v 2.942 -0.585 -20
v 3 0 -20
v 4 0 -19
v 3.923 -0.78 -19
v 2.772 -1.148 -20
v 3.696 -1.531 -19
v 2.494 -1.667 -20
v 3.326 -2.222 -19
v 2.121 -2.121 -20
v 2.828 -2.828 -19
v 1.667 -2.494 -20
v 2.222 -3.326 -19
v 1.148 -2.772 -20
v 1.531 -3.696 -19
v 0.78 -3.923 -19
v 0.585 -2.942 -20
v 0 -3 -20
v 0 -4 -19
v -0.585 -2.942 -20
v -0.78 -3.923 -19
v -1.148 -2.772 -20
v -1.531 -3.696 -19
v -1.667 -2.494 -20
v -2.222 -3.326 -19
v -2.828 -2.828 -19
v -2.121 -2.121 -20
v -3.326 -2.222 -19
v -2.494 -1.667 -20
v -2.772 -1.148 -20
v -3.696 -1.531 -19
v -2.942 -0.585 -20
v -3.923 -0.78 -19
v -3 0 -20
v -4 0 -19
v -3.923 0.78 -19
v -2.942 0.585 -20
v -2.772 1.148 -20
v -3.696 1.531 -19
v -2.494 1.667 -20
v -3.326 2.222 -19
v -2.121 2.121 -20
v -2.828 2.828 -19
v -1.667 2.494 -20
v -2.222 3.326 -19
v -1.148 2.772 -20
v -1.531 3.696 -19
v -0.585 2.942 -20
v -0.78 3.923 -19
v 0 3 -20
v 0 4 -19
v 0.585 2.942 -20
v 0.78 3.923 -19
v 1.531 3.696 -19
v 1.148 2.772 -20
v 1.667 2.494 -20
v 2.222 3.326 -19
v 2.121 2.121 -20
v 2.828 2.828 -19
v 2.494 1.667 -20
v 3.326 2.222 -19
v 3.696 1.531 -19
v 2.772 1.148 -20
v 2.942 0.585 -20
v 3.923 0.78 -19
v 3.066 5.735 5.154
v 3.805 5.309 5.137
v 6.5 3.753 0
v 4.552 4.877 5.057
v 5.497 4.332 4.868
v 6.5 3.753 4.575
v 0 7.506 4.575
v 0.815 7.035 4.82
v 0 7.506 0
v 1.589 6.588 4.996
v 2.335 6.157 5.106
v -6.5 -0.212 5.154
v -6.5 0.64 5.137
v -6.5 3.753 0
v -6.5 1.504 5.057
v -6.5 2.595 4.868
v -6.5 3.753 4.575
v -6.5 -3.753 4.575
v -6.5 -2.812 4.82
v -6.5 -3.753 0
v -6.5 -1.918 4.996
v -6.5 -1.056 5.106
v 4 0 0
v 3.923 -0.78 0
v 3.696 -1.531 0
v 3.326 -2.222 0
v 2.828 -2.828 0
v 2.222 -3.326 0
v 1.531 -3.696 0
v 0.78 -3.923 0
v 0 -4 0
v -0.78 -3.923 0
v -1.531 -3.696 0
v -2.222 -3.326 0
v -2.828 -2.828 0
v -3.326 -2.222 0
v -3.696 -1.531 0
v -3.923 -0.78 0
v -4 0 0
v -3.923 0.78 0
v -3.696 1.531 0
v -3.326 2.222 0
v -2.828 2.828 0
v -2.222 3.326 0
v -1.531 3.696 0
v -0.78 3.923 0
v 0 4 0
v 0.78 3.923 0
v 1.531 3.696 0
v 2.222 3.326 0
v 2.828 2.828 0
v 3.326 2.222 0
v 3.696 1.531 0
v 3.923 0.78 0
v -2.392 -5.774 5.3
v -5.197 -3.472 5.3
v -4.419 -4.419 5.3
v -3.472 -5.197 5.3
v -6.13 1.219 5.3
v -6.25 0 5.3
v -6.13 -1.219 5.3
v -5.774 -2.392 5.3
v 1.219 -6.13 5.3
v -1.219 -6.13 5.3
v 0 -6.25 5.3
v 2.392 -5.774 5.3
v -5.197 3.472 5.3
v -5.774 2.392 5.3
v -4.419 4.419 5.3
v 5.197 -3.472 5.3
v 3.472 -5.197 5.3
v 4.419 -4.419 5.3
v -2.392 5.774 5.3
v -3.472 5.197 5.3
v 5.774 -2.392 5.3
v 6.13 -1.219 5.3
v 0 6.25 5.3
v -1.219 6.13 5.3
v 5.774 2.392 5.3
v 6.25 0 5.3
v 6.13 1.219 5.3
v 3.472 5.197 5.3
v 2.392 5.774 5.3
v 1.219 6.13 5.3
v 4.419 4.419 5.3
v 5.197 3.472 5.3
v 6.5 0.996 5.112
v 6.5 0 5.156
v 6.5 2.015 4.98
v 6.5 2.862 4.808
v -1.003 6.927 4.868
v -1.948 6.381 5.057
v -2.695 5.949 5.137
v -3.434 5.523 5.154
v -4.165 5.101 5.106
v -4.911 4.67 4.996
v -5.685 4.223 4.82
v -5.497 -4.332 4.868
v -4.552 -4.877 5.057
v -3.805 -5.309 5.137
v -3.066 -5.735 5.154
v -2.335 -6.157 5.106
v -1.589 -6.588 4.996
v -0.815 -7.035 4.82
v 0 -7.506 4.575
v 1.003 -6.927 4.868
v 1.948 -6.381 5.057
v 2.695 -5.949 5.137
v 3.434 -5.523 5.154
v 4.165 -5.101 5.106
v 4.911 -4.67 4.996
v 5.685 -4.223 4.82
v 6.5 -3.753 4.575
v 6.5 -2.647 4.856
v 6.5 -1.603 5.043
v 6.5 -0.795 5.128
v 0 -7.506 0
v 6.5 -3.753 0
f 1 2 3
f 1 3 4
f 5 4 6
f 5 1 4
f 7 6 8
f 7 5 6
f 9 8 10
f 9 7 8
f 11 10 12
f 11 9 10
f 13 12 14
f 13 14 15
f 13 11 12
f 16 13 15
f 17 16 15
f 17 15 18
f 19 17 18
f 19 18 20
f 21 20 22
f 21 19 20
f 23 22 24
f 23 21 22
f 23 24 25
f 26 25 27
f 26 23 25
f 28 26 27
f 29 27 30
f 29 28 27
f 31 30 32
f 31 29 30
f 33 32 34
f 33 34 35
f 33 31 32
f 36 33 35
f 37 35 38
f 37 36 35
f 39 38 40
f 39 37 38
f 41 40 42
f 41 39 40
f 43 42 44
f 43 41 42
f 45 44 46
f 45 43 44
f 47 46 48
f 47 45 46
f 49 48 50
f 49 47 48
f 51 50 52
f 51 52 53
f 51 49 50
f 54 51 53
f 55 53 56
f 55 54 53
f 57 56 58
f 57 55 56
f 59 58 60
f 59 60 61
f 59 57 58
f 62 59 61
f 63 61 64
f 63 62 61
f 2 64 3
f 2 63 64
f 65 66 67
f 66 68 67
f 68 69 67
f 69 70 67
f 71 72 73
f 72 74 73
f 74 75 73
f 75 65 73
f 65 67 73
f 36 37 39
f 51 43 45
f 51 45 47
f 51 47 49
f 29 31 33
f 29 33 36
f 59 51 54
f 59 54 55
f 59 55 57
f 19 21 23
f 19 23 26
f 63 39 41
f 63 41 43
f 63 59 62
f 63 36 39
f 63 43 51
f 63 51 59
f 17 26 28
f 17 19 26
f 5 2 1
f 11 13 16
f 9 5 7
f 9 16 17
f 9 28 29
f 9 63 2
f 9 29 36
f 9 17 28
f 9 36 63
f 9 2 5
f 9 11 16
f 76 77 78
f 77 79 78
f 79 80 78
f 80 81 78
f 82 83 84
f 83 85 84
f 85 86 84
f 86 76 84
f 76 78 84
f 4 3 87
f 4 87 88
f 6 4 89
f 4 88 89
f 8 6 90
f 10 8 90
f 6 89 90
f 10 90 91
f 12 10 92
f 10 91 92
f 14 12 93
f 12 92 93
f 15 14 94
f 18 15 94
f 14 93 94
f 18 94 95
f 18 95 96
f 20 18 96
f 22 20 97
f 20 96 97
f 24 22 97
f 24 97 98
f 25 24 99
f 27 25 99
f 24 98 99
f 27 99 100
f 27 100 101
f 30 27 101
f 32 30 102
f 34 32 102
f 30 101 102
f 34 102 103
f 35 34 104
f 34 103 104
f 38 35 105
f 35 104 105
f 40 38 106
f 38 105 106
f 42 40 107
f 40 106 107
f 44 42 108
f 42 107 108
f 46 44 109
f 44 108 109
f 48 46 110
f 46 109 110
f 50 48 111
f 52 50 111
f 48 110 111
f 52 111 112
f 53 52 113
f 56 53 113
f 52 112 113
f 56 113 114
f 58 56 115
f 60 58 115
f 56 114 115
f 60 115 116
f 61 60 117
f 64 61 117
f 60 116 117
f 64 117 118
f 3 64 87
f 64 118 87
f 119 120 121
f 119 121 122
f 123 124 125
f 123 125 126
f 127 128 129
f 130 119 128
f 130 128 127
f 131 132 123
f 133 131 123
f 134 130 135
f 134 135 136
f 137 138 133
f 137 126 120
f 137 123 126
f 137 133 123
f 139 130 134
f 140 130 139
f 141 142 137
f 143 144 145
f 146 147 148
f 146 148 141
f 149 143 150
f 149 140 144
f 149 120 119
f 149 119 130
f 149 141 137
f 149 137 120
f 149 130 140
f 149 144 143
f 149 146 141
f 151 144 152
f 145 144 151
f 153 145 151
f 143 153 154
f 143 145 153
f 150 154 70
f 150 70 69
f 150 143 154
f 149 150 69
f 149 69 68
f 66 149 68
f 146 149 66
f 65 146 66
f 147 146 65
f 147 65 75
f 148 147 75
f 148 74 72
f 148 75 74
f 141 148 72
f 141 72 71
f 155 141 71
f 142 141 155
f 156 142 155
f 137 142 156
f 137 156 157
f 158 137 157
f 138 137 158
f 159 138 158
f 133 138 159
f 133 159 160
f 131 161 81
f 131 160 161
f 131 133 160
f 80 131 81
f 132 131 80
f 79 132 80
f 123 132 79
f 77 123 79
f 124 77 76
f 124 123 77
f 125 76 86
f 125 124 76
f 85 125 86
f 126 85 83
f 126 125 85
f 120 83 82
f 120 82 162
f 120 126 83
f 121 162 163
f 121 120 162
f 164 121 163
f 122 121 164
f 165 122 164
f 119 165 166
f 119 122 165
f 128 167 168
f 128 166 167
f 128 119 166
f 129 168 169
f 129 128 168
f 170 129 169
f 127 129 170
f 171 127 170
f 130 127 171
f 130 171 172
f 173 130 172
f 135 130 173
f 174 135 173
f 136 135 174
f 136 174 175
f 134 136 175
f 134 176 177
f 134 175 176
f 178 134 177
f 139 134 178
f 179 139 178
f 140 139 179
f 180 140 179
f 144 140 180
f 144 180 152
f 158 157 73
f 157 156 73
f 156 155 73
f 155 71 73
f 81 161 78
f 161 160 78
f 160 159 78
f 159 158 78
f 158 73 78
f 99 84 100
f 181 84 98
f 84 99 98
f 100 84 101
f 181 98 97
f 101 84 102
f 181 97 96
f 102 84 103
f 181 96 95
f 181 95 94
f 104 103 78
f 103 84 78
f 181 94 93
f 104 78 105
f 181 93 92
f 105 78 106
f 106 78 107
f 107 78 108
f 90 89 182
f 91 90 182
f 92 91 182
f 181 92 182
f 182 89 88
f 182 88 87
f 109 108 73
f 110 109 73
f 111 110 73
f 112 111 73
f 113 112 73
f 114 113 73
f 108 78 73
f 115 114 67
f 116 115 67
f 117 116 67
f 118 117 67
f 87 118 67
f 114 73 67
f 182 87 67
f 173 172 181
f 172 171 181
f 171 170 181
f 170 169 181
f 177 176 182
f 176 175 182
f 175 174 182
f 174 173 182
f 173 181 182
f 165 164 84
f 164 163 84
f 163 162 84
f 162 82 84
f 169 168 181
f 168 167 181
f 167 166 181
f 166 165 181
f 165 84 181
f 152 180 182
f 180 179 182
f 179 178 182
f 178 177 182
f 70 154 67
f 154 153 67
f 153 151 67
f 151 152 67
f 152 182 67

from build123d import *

# Parameters (mm, degrees)
EXTRUDE_1_DEPTH     = 5.3
SKETCH_2_OUTSIDE_W  = 61.562
SKETCH_2_OUTSIDE_H  = 63.574
SKETCH_2_OUTSIDE_R  = 6.25
CUT_EXTRUDE_1_DEPTH = 12.254924848
CUT_EXTRUDE_1_DRAFT = -60
SKETCH_3_R          = 4
EXTRUDE_2_DEPTH     = 20
CHAMFER_1_SIZE      = 1


with BuildPart() as part:
    # Эскиз1 → Бобышка-Вытянуть1 (new body)
    with BuildSketch(Plane.XY):
        Polygon((0, 7.505553499), (-6.5, 3.75277675), (-6.5, -3.75277675), (0, -7.505553499), (6.5, -3.75277675), (6.5, 3.75277675), align=None)
    extrude(amount=EXTRUDE_1_DEPTH)


with BuildPart() as cut_extrude_1_tool:
    # Эскиз2 outside → Вырез-Вытянуть1 (with draft: the straight prism first)
    with BuildSketch(Plane.XY.offset(5.3)):
        Rectangle(SKETCH_2_OUTSIDE_W, SKETCH_2_OUTSIDE_H)
        Circle(SKETCH_2_OUTSIDE_R, mode=Mode.SUBTRACT)
    extrude(amount=-CUT_EXTRUDE_1_DEPTH)
    # Вырез-Вытянуть1: the draft: its side faces are tilted about the plane it starts from
    cut_extrude_1_sides = [cut_extrude_1_tool.faces().sort_by_distance(p)[0] for p in [
        (0, -31.787, -0.827462424),
        (30.781, 0, -0.827462424),
        (0, 31.787, -0.827462424),
        (-30.781, 0, -0.827462424),
        (-6.25, 0, -0.827462424),
    ]]
    draft(cut_extrude_1_sides, Plane.XY.offset(5.3), CUT_EXTRUDE_1_DRAFT)


with BuildPart() as part_1:
    add(part.part)

    # Вырез-Вытянуть1: cut by cut_extrude_1_tool
    add(cut_extrude_1_tool.part, mode=Mode.SUBTRACT)

    # Эскиз3 → Бобышка-Вытянуть2 (add)
    with BuildSketch(Plane(origin=(0, 0, 0), x_dir=(-1, 0, 0), z_dir=(0, 0, -1))):
        with Locations(Location((0, 0, 0), (0, 0, 180))):
            Circle(SKETCH_3_R)
    extrude(amount=EXTRUDE_2_DEPTH)

    # Фаска1
    chamfer_1_edges = [part_1.edges().sort_by_distance(p)[0] for p in [
        (-4, 0, -20),
    ]]
    chamfer(chamfer_1_edges, length=CHAMFER_1_SIZE)


solid = part_1.part
